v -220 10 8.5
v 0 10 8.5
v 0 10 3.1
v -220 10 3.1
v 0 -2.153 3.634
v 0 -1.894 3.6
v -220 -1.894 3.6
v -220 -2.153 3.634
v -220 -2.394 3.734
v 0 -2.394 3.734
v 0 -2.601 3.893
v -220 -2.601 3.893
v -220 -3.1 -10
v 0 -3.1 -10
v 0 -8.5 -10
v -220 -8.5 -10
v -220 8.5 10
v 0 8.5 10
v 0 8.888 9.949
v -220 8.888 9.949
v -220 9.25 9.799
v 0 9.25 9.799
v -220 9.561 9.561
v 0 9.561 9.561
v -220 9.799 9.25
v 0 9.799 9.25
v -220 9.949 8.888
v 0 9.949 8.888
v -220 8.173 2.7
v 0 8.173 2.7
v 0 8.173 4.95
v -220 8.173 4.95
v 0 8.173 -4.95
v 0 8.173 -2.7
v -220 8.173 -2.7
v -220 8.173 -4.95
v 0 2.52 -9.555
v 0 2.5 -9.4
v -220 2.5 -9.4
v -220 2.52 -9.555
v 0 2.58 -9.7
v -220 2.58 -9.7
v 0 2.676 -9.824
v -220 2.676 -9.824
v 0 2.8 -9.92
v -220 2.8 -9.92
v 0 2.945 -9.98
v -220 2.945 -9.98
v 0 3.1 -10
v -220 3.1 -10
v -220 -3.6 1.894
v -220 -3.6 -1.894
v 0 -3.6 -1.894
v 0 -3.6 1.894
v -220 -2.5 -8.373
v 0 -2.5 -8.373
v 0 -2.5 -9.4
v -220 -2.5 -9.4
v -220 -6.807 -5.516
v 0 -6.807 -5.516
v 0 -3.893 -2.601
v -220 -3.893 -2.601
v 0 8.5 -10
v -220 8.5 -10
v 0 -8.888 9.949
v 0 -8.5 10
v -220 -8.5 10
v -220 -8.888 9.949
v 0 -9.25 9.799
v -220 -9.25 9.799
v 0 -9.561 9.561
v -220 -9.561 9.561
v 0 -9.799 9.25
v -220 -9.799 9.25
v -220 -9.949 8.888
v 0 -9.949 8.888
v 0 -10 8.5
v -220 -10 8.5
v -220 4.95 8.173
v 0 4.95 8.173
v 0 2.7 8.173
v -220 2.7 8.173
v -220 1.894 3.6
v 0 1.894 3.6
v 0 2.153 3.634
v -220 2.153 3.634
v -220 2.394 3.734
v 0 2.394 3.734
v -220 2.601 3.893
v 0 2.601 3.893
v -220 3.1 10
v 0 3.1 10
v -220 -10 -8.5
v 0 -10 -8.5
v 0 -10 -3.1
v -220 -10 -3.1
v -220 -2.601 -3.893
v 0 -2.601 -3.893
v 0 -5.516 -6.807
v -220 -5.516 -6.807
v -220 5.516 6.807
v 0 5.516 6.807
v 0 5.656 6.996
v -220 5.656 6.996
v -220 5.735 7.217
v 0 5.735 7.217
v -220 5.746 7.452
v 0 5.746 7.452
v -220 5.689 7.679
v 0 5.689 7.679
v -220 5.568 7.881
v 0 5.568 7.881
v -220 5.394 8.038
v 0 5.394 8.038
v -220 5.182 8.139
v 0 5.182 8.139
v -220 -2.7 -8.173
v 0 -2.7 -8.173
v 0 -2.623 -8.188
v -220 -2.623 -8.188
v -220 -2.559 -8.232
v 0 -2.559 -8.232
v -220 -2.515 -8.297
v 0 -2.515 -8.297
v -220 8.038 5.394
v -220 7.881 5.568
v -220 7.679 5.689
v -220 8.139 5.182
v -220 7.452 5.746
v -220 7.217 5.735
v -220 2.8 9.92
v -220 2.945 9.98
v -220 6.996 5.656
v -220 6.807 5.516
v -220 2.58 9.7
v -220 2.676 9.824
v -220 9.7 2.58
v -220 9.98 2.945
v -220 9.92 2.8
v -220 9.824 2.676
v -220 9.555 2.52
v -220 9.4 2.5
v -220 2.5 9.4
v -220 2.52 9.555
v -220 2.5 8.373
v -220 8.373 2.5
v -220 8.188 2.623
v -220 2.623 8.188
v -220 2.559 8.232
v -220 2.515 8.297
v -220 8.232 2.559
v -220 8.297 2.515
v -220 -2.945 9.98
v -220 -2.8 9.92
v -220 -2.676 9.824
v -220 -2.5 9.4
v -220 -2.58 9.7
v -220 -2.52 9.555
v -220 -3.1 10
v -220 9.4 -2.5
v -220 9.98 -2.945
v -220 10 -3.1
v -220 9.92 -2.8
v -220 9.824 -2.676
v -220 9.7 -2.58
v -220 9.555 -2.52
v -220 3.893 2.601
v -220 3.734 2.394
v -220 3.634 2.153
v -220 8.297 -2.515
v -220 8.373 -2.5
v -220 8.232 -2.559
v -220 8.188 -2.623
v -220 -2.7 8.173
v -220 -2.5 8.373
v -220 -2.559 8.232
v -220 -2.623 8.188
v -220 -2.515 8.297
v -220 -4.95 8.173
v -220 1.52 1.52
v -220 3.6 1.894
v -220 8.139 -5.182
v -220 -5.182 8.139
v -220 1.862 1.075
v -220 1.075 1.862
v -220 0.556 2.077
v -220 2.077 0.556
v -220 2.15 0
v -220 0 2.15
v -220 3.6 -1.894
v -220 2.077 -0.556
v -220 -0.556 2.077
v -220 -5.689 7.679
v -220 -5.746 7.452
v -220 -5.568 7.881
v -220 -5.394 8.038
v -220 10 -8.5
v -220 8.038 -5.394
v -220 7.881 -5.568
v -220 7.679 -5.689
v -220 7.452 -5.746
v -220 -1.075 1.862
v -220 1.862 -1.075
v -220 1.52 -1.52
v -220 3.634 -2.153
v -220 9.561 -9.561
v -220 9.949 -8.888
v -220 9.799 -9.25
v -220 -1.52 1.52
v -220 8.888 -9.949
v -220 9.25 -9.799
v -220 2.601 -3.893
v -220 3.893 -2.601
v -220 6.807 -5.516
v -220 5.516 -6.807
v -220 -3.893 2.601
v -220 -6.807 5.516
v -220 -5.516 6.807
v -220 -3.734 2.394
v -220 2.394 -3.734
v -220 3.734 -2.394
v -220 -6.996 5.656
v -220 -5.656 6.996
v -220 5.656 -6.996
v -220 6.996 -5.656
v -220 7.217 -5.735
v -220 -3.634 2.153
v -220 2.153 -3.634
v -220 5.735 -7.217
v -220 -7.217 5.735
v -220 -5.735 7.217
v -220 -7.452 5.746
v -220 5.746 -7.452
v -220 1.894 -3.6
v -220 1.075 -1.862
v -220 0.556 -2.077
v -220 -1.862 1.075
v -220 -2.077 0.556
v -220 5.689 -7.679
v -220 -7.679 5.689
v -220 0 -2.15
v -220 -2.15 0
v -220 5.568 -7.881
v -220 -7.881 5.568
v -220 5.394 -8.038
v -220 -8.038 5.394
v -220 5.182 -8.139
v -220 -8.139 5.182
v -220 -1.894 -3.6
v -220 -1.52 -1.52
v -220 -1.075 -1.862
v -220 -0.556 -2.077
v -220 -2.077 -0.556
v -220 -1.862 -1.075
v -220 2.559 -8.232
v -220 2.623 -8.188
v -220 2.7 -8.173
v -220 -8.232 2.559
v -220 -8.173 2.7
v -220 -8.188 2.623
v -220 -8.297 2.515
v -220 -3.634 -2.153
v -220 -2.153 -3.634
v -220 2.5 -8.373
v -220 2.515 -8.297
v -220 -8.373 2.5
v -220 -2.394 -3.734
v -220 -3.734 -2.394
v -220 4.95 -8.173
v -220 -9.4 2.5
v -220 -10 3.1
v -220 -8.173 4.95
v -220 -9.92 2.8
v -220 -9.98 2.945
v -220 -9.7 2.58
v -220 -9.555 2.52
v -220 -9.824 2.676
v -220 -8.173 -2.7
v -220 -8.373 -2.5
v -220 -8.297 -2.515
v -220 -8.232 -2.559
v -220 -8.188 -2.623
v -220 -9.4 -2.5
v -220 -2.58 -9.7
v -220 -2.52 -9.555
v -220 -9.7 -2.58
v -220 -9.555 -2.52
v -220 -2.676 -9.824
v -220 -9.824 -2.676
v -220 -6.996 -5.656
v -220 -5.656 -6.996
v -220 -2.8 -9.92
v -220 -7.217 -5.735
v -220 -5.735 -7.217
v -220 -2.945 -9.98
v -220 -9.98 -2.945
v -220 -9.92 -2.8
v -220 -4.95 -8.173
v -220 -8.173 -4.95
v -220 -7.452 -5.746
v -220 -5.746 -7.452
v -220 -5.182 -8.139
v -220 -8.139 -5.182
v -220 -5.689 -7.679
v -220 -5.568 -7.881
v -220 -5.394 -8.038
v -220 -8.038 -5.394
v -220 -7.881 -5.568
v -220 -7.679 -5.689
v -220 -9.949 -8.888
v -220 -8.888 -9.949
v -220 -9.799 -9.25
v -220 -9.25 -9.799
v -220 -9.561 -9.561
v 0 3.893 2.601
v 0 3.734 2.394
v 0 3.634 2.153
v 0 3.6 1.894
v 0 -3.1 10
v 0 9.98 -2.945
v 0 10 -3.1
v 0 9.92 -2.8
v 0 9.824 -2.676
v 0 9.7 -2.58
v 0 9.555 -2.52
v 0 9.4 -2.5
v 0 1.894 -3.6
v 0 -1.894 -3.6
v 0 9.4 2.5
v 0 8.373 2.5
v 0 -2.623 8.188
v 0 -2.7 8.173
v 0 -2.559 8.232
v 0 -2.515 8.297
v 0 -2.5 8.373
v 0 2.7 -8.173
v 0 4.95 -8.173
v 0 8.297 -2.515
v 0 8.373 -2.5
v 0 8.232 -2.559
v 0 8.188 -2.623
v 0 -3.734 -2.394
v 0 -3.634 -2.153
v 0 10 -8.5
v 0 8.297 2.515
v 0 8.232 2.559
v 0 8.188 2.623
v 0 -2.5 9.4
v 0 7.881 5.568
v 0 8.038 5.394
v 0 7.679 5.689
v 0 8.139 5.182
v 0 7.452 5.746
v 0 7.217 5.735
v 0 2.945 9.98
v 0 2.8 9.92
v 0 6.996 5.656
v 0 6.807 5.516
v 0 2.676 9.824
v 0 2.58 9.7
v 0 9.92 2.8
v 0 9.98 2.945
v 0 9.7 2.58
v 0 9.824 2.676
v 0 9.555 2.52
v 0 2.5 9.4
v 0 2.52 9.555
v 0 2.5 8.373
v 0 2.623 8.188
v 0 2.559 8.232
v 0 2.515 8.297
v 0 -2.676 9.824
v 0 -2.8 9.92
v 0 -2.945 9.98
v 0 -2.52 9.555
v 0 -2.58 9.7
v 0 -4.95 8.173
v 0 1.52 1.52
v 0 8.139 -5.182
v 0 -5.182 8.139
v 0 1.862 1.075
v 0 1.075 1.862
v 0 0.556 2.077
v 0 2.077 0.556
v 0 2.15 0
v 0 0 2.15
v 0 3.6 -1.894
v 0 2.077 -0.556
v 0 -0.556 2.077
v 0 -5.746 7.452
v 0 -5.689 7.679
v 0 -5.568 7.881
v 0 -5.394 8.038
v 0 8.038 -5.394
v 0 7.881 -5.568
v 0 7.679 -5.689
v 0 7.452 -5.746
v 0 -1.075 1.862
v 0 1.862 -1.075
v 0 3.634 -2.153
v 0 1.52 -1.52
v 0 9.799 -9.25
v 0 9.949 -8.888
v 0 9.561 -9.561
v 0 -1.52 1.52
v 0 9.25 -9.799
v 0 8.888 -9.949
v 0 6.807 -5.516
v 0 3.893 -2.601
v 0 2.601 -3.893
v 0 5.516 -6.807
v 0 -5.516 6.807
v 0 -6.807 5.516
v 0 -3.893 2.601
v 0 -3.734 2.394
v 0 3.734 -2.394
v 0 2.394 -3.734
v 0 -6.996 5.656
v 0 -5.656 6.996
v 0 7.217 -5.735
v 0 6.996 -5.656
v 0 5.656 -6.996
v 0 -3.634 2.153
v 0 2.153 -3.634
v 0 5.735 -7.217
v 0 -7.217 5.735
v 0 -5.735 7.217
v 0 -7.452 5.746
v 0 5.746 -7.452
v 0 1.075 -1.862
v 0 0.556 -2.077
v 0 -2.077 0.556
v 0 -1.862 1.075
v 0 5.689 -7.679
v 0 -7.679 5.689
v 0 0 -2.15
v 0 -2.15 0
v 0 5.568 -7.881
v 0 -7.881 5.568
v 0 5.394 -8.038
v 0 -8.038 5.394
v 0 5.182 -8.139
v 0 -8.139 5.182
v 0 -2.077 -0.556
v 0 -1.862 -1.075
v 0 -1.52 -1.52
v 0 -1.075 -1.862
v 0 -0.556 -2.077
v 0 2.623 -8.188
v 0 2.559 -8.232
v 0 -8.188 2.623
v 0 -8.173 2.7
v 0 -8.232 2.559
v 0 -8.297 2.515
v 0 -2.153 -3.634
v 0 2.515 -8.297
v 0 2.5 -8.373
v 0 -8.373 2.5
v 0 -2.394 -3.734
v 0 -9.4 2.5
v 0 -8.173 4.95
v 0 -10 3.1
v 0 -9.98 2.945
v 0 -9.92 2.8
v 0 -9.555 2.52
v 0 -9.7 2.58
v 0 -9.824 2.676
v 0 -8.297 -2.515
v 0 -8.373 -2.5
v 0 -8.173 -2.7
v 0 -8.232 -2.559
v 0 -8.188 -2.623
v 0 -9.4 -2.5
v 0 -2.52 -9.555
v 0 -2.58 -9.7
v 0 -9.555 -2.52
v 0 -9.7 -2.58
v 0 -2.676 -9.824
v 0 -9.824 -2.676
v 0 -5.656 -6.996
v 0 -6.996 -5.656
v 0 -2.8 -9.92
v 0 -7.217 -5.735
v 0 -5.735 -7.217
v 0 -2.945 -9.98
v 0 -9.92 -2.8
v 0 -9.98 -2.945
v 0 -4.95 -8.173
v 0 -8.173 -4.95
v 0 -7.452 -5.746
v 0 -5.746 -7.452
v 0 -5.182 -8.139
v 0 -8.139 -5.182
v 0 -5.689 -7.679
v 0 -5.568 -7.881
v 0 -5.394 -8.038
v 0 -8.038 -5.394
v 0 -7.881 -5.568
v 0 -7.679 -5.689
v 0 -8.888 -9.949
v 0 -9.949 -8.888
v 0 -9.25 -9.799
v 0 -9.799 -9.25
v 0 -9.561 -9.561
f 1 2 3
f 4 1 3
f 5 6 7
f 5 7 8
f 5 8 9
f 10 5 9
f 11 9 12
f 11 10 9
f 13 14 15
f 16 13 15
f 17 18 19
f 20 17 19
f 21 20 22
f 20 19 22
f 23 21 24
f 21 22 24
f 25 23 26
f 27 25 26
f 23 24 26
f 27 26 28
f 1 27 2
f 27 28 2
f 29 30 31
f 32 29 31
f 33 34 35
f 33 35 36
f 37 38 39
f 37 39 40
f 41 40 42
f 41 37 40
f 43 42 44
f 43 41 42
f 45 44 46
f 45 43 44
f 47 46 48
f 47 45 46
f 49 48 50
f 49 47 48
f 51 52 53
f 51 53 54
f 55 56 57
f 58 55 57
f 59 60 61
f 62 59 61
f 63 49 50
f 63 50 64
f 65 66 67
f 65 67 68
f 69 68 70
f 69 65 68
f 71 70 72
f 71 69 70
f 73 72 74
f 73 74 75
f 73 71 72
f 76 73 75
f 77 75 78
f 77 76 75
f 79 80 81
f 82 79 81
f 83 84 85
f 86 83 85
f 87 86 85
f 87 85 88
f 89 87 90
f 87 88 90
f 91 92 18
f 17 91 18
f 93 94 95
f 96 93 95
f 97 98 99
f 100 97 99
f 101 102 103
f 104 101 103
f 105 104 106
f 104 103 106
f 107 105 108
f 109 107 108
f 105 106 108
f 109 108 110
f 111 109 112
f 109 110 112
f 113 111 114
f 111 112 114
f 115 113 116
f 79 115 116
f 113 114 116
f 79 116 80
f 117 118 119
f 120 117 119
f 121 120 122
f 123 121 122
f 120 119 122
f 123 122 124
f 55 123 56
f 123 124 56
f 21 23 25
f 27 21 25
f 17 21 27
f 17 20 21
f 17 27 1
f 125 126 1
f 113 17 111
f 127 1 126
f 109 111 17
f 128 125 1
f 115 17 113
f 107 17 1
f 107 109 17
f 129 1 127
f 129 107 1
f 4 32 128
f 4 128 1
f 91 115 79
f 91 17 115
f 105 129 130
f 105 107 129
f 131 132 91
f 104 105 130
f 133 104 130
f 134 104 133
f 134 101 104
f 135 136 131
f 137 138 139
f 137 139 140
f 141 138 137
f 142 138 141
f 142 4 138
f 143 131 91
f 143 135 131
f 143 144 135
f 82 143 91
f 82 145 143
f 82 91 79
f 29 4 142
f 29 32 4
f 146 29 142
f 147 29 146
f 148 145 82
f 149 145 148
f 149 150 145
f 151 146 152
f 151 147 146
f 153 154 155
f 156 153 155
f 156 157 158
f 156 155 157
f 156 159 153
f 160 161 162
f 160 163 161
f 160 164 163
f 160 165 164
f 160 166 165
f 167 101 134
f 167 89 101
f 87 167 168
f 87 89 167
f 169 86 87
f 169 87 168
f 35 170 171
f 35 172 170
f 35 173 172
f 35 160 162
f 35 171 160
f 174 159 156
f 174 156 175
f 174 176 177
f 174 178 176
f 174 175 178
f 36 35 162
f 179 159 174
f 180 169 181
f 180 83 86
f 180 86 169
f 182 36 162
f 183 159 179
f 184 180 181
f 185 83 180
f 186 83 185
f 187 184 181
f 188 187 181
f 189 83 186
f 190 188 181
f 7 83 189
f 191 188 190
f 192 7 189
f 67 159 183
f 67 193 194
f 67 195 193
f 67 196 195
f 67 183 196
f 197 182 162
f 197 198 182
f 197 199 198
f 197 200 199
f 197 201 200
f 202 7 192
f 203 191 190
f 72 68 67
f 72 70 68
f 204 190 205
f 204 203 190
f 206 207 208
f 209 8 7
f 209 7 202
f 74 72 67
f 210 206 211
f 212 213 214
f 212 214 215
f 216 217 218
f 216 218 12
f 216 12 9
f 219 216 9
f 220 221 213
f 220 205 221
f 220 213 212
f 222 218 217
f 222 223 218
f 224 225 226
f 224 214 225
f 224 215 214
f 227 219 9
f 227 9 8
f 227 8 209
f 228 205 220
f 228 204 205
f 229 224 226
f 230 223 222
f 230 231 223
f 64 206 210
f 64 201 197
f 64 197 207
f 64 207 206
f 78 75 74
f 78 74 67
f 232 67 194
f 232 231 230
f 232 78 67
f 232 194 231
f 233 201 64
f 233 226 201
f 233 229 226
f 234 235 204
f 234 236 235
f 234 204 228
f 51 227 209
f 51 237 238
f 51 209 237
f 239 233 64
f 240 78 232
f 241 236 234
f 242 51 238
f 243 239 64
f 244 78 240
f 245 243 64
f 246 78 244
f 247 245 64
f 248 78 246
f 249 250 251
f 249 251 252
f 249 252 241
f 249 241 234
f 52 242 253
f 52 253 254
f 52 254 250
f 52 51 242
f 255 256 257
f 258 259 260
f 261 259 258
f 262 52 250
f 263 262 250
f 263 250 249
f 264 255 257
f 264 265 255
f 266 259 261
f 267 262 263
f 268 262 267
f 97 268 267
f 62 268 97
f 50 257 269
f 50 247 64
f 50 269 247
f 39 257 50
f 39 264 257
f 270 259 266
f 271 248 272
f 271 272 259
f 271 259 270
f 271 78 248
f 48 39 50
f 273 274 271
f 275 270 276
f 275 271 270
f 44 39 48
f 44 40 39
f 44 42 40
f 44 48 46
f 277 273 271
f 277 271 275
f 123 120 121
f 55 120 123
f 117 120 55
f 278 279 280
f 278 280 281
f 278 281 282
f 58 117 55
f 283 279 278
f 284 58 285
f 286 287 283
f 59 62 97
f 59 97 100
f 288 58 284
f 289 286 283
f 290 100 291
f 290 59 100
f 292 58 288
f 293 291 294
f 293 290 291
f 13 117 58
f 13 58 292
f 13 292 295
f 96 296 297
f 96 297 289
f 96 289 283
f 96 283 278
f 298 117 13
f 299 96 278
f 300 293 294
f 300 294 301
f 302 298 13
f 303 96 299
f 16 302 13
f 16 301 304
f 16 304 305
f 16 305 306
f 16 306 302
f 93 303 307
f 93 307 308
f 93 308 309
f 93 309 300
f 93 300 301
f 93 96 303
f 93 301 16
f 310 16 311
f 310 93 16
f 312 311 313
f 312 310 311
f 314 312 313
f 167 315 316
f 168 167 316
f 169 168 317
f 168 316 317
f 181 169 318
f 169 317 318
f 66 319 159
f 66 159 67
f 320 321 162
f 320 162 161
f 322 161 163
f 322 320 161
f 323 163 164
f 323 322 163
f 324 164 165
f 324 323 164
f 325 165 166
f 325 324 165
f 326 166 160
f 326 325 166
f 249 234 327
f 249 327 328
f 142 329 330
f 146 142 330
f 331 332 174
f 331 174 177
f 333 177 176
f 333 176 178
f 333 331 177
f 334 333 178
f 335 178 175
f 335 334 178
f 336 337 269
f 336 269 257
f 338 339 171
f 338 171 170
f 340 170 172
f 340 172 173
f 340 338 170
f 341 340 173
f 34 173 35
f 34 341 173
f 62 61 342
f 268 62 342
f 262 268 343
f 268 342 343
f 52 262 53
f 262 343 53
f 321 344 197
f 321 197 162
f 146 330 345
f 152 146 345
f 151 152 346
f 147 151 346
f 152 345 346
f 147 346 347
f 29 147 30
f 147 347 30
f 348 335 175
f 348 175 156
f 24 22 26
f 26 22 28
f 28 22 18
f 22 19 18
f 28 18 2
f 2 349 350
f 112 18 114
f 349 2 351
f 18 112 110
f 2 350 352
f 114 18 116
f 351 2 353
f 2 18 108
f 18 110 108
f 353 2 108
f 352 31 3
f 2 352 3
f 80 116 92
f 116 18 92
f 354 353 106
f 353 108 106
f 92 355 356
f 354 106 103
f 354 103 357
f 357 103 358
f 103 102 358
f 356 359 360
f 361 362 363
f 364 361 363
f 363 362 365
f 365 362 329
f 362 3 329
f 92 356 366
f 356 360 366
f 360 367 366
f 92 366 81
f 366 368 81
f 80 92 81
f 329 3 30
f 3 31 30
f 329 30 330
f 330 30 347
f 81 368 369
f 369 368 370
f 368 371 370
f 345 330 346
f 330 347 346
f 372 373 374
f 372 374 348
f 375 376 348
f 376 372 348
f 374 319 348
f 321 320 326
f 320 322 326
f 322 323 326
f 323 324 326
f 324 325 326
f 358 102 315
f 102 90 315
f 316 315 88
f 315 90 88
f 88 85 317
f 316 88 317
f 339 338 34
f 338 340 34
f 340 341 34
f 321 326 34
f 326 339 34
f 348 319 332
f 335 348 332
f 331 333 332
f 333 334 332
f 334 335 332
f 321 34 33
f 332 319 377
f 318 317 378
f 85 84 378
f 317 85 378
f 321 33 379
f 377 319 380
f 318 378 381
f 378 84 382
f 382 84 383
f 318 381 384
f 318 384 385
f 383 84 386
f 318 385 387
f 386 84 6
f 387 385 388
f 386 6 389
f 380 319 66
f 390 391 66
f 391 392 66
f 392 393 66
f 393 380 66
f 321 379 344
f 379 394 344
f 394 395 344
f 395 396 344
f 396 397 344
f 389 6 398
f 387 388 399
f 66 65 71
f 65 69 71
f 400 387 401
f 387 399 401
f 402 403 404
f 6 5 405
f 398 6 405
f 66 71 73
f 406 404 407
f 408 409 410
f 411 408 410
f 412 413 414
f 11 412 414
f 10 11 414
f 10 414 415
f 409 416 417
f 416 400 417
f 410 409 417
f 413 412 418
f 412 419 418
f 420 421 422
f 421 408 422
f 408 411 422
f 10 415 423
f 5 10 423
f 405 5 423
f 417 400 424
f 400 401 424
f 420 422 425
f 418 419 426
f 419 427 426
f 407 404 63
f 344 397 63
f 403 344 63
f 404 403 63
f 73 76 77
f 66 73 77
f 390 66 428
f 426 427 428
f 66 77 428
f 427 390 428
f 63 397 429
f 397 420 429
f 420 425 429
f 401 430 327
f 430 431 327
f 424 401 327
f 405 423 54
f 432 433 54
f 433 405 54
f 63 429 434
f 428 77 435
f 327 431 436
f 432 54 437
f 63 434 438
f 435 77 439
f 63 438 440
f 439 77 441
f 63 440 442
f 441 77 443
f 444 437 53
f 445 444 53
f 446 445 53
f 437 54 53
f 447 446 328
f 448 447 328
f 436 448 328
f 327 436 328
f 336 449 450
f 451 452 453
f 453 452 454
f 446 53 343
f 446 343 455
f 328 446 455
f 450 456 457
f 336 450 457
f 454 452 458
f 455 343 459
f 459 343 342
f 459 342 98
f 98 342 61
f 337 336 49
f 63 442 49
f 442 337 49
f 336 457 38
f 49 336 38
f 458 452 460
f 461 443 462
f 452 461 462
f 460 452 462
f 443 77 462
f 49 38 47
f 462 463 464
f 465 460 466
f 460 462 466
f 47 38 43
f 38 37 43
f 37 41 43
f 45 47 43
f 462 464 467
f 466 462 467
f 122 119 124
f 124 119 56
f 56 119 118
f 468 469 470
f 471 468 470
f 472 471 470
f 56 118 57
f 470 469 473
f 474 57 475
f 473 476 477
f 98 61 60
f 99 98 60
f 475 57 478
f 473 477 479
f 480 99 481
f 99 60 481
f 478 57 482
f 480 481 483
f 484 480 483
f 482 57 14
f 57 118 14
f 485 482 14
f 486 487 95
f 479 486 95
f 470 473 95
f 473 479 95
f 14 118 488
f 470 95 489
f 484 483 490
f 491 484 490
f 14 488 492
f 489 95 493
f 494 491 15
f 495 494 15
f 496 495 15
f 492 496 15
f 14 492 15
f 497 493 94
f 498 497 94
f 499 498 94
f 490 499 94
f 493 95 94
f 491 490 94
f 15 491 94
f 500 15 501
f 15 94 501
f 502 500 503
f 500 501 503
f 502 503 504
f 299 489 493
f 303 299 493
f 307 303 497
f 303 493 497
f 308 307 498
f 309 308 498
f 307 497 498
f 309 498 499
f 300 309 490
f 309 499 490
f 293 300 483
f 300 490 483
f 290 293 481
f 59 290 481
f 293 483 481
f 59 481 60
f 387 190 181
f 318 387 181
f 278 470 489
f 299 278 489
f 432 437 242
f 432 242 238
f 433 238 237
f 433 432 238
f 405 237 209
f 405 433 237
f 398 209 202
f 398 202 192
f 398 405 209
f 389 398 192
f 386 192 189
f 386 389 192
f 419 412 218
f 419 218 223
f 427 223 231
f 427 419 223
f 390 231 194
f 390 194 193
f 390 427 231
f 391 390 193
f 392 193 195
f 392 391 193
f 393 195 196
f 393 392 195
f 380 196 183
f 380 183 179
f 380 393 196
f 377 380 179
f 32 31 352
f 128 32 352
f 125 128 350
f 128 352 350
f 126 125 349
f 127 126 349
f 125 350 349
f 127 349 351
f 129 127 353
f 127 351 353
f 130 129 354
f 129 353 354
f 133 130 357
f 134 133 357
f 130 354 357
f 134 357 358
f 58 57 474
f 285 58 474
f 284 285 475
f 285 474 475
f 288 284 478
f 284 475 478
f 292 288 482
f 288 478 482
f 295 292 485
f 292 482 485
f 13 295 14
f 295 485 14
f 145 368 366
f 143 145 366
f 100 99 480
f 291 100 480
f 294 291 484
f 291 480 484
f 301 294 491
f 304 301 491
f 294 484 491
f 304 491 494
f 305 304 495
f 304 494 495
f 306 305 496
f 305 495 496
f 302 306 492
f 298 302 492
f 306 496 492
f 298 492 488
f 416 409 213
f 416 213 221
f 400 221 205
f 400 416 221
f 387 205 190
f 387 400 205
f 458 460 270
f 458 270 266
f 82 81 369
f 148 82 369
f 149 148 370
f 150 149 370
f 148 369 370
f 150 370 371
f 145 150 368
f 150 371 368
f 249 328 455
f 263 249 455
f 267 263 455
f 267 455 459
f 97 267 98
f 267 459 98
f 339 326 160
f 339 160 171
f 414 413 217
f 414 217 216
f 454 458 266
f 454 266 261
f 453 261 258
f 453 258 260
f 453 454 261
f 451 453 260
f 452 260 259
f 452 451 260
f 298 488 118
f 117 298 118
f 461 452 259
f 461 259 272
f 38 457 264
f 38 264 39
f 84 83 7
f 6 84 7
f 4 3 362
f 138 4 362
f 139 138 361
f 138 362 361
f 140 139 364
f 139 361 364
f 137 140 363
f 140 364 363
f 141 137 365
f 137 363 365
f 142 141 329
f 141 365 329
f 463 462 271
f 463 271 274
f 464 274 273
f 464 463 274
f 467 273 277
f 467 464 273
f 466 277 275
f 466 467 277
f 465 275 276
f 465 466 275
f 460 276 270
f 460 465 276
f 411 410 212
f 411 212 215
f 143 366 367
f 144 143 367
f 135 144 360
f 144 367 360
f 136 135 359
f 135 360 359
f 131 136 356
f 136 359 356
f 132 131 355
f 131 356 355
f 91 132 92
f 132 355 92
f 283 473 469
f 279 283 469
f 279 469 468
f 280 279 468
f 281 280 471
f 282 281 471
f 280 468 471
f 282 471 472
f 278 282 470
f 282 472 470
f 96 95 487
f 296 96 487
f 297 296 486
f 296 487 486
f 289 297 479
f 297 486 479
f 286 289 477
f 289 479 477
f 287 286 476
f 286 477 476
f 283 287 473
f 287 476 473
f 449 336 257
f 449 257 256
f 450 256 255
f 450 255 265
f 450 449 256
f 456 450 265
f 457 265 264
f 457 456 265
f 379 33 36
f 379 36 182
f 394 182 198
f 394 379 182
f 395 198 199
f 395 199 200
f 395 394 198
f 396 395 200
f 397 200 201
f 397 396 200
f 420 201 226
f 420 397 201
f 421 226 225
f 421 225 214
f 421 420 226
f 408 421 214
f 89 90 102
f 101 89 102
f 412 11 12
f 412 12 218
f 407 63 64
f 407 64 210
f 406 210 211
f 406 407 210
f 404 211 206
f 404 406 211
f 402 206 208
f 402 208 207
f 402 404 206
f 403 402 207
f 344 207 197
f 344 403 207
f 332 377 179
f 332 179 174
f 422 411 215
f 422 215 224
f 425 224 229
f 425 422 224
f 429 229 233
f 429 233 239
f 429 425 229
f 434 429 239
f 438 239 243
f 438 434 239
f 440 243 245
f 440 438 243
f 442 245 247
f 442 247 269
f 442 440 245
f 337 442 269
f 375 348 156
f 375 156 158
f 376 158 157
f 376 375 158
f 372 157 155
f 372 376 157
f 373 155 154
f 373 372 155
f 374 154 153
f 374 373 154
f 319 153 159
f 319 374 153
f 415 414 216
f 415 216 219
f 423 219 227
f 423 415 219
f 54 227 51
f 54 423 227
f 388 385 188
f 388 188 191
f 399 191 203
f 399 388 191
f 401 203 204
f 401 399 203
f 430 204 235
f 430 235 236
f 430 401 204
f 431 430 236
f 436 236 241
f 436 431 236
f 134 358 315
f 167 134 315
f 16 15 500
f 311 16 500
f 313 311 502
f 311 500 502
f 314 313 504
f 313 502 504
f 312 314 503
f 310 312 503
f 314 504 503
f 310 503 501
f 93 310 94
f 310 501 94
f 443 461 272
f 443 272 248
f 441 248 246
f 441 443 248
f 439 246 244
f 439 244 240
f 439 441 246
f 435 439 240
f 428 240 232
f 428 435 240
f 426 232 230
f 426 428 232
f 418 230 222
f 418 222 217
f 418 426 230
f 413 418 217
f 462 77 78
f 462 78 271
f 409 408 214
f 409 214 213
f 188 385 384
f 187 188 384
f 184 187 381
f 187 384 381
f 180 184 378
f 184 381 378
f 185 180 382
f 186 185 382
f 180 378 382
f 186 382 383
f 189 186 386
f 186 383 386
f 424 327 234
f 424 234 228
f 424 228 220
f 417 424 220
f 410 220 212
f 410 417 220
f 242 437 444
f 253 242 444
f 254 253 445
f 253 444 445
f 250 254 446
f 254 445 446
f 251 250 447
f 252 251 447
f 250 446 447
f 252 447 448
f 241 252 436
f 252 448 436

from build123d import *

# Parameters (mm, degrees)
BOSS_EXTRUDE1_DEPTH = 220


with BuildPart() as part:
    # Sketch3 → Boss-Extrude1 (new body)
    with BuildSketch(Plane(origin=(0, 0, 0), x_dir=(0, 0, -1), z_dir=(1, 0, 0))):
        with BuildLine():
            Line((-5.515685425, 6.807463915), (-2.601114729, 3.892893219))
            ThreePointArc((-2.601114729, 3.892893219), (-2.27669138, 3.676120467), (-1.894007948, 3.6))
            Line((-1.894007948, 3.6), (0, 3.6))
            Line((0, 3.6), (0, 2.15))
            ThreePointArc((0, 2.15), (-1.52027958, 1.52027958), (-2.15, 0))
            Line((-2.15, 0), (-3.6, 0))
            Line((-3.6, 0), (-3.6, 1.894007948))
            ThreePointArc((-3.6, 1.894007948), (-3.676120467, 2.27669138), (-3.892893219, 2.601114729))
            Line((-3.892893219, 2.601114729), (-6.807463915, 5.515685425))
            ThreePointArc((-6.807463915, 5.515685425), (-7.679296086, 5.689103626), (-8.17314934, 4.95))
            Line((-8.17314934, 4.95), (-8.17314934, 2.7))
            ThreePointArc((-8.17314934, 2.7), (-8.231727984, 2.558578644), (-8.37314934, 2.5))
            Line((-8.37314934, 2.5), (-9.4, 2.5))
            ThreePointArc((-9.4, 2.5), (-9.824264069, 2.675735931), (-10, 3.1))
            Line((-10, 3.1), (-10, 8.5))
            ThreePointArc((-10, 8.5), (-9.560660172, 9.560660172), (-8.5, 10))
            Line((-8.5, 10), (-3.1, 10))
            ThreePointArc((-3.1, 10), (-2.675735931, 9.824264069), (-2.5, 9.4))
            Line((-2.5, 9.4), (-2.5, 8.37314934))
            ThreePointArc((-2.5, 8.37314934), (-2.558578644, 8.231727984), (-2.7, 8.17314934))
            Line((-2.7, 8.17314934), (-4.95, 8.17314934))
            ThreePointArc((-4.95, 8.17314934), (-5.689103626, 7.679296086), (-5.515685425, 6.807463915))
        make_face()
    extrude(amount=-BOSS_EXTRUDE1_DEPTH)

    # Mirror1: part across plane


with BuildPart() as part_1:
    add(part.part)
    add(part.part.mirror(Plane.ZX))

    # Mirror2: part across plane


with BuildPart() as part_2:
    add(part_1.part)
    add(part_1.part.mirror(Plane.XY))


solid = part_2.part
